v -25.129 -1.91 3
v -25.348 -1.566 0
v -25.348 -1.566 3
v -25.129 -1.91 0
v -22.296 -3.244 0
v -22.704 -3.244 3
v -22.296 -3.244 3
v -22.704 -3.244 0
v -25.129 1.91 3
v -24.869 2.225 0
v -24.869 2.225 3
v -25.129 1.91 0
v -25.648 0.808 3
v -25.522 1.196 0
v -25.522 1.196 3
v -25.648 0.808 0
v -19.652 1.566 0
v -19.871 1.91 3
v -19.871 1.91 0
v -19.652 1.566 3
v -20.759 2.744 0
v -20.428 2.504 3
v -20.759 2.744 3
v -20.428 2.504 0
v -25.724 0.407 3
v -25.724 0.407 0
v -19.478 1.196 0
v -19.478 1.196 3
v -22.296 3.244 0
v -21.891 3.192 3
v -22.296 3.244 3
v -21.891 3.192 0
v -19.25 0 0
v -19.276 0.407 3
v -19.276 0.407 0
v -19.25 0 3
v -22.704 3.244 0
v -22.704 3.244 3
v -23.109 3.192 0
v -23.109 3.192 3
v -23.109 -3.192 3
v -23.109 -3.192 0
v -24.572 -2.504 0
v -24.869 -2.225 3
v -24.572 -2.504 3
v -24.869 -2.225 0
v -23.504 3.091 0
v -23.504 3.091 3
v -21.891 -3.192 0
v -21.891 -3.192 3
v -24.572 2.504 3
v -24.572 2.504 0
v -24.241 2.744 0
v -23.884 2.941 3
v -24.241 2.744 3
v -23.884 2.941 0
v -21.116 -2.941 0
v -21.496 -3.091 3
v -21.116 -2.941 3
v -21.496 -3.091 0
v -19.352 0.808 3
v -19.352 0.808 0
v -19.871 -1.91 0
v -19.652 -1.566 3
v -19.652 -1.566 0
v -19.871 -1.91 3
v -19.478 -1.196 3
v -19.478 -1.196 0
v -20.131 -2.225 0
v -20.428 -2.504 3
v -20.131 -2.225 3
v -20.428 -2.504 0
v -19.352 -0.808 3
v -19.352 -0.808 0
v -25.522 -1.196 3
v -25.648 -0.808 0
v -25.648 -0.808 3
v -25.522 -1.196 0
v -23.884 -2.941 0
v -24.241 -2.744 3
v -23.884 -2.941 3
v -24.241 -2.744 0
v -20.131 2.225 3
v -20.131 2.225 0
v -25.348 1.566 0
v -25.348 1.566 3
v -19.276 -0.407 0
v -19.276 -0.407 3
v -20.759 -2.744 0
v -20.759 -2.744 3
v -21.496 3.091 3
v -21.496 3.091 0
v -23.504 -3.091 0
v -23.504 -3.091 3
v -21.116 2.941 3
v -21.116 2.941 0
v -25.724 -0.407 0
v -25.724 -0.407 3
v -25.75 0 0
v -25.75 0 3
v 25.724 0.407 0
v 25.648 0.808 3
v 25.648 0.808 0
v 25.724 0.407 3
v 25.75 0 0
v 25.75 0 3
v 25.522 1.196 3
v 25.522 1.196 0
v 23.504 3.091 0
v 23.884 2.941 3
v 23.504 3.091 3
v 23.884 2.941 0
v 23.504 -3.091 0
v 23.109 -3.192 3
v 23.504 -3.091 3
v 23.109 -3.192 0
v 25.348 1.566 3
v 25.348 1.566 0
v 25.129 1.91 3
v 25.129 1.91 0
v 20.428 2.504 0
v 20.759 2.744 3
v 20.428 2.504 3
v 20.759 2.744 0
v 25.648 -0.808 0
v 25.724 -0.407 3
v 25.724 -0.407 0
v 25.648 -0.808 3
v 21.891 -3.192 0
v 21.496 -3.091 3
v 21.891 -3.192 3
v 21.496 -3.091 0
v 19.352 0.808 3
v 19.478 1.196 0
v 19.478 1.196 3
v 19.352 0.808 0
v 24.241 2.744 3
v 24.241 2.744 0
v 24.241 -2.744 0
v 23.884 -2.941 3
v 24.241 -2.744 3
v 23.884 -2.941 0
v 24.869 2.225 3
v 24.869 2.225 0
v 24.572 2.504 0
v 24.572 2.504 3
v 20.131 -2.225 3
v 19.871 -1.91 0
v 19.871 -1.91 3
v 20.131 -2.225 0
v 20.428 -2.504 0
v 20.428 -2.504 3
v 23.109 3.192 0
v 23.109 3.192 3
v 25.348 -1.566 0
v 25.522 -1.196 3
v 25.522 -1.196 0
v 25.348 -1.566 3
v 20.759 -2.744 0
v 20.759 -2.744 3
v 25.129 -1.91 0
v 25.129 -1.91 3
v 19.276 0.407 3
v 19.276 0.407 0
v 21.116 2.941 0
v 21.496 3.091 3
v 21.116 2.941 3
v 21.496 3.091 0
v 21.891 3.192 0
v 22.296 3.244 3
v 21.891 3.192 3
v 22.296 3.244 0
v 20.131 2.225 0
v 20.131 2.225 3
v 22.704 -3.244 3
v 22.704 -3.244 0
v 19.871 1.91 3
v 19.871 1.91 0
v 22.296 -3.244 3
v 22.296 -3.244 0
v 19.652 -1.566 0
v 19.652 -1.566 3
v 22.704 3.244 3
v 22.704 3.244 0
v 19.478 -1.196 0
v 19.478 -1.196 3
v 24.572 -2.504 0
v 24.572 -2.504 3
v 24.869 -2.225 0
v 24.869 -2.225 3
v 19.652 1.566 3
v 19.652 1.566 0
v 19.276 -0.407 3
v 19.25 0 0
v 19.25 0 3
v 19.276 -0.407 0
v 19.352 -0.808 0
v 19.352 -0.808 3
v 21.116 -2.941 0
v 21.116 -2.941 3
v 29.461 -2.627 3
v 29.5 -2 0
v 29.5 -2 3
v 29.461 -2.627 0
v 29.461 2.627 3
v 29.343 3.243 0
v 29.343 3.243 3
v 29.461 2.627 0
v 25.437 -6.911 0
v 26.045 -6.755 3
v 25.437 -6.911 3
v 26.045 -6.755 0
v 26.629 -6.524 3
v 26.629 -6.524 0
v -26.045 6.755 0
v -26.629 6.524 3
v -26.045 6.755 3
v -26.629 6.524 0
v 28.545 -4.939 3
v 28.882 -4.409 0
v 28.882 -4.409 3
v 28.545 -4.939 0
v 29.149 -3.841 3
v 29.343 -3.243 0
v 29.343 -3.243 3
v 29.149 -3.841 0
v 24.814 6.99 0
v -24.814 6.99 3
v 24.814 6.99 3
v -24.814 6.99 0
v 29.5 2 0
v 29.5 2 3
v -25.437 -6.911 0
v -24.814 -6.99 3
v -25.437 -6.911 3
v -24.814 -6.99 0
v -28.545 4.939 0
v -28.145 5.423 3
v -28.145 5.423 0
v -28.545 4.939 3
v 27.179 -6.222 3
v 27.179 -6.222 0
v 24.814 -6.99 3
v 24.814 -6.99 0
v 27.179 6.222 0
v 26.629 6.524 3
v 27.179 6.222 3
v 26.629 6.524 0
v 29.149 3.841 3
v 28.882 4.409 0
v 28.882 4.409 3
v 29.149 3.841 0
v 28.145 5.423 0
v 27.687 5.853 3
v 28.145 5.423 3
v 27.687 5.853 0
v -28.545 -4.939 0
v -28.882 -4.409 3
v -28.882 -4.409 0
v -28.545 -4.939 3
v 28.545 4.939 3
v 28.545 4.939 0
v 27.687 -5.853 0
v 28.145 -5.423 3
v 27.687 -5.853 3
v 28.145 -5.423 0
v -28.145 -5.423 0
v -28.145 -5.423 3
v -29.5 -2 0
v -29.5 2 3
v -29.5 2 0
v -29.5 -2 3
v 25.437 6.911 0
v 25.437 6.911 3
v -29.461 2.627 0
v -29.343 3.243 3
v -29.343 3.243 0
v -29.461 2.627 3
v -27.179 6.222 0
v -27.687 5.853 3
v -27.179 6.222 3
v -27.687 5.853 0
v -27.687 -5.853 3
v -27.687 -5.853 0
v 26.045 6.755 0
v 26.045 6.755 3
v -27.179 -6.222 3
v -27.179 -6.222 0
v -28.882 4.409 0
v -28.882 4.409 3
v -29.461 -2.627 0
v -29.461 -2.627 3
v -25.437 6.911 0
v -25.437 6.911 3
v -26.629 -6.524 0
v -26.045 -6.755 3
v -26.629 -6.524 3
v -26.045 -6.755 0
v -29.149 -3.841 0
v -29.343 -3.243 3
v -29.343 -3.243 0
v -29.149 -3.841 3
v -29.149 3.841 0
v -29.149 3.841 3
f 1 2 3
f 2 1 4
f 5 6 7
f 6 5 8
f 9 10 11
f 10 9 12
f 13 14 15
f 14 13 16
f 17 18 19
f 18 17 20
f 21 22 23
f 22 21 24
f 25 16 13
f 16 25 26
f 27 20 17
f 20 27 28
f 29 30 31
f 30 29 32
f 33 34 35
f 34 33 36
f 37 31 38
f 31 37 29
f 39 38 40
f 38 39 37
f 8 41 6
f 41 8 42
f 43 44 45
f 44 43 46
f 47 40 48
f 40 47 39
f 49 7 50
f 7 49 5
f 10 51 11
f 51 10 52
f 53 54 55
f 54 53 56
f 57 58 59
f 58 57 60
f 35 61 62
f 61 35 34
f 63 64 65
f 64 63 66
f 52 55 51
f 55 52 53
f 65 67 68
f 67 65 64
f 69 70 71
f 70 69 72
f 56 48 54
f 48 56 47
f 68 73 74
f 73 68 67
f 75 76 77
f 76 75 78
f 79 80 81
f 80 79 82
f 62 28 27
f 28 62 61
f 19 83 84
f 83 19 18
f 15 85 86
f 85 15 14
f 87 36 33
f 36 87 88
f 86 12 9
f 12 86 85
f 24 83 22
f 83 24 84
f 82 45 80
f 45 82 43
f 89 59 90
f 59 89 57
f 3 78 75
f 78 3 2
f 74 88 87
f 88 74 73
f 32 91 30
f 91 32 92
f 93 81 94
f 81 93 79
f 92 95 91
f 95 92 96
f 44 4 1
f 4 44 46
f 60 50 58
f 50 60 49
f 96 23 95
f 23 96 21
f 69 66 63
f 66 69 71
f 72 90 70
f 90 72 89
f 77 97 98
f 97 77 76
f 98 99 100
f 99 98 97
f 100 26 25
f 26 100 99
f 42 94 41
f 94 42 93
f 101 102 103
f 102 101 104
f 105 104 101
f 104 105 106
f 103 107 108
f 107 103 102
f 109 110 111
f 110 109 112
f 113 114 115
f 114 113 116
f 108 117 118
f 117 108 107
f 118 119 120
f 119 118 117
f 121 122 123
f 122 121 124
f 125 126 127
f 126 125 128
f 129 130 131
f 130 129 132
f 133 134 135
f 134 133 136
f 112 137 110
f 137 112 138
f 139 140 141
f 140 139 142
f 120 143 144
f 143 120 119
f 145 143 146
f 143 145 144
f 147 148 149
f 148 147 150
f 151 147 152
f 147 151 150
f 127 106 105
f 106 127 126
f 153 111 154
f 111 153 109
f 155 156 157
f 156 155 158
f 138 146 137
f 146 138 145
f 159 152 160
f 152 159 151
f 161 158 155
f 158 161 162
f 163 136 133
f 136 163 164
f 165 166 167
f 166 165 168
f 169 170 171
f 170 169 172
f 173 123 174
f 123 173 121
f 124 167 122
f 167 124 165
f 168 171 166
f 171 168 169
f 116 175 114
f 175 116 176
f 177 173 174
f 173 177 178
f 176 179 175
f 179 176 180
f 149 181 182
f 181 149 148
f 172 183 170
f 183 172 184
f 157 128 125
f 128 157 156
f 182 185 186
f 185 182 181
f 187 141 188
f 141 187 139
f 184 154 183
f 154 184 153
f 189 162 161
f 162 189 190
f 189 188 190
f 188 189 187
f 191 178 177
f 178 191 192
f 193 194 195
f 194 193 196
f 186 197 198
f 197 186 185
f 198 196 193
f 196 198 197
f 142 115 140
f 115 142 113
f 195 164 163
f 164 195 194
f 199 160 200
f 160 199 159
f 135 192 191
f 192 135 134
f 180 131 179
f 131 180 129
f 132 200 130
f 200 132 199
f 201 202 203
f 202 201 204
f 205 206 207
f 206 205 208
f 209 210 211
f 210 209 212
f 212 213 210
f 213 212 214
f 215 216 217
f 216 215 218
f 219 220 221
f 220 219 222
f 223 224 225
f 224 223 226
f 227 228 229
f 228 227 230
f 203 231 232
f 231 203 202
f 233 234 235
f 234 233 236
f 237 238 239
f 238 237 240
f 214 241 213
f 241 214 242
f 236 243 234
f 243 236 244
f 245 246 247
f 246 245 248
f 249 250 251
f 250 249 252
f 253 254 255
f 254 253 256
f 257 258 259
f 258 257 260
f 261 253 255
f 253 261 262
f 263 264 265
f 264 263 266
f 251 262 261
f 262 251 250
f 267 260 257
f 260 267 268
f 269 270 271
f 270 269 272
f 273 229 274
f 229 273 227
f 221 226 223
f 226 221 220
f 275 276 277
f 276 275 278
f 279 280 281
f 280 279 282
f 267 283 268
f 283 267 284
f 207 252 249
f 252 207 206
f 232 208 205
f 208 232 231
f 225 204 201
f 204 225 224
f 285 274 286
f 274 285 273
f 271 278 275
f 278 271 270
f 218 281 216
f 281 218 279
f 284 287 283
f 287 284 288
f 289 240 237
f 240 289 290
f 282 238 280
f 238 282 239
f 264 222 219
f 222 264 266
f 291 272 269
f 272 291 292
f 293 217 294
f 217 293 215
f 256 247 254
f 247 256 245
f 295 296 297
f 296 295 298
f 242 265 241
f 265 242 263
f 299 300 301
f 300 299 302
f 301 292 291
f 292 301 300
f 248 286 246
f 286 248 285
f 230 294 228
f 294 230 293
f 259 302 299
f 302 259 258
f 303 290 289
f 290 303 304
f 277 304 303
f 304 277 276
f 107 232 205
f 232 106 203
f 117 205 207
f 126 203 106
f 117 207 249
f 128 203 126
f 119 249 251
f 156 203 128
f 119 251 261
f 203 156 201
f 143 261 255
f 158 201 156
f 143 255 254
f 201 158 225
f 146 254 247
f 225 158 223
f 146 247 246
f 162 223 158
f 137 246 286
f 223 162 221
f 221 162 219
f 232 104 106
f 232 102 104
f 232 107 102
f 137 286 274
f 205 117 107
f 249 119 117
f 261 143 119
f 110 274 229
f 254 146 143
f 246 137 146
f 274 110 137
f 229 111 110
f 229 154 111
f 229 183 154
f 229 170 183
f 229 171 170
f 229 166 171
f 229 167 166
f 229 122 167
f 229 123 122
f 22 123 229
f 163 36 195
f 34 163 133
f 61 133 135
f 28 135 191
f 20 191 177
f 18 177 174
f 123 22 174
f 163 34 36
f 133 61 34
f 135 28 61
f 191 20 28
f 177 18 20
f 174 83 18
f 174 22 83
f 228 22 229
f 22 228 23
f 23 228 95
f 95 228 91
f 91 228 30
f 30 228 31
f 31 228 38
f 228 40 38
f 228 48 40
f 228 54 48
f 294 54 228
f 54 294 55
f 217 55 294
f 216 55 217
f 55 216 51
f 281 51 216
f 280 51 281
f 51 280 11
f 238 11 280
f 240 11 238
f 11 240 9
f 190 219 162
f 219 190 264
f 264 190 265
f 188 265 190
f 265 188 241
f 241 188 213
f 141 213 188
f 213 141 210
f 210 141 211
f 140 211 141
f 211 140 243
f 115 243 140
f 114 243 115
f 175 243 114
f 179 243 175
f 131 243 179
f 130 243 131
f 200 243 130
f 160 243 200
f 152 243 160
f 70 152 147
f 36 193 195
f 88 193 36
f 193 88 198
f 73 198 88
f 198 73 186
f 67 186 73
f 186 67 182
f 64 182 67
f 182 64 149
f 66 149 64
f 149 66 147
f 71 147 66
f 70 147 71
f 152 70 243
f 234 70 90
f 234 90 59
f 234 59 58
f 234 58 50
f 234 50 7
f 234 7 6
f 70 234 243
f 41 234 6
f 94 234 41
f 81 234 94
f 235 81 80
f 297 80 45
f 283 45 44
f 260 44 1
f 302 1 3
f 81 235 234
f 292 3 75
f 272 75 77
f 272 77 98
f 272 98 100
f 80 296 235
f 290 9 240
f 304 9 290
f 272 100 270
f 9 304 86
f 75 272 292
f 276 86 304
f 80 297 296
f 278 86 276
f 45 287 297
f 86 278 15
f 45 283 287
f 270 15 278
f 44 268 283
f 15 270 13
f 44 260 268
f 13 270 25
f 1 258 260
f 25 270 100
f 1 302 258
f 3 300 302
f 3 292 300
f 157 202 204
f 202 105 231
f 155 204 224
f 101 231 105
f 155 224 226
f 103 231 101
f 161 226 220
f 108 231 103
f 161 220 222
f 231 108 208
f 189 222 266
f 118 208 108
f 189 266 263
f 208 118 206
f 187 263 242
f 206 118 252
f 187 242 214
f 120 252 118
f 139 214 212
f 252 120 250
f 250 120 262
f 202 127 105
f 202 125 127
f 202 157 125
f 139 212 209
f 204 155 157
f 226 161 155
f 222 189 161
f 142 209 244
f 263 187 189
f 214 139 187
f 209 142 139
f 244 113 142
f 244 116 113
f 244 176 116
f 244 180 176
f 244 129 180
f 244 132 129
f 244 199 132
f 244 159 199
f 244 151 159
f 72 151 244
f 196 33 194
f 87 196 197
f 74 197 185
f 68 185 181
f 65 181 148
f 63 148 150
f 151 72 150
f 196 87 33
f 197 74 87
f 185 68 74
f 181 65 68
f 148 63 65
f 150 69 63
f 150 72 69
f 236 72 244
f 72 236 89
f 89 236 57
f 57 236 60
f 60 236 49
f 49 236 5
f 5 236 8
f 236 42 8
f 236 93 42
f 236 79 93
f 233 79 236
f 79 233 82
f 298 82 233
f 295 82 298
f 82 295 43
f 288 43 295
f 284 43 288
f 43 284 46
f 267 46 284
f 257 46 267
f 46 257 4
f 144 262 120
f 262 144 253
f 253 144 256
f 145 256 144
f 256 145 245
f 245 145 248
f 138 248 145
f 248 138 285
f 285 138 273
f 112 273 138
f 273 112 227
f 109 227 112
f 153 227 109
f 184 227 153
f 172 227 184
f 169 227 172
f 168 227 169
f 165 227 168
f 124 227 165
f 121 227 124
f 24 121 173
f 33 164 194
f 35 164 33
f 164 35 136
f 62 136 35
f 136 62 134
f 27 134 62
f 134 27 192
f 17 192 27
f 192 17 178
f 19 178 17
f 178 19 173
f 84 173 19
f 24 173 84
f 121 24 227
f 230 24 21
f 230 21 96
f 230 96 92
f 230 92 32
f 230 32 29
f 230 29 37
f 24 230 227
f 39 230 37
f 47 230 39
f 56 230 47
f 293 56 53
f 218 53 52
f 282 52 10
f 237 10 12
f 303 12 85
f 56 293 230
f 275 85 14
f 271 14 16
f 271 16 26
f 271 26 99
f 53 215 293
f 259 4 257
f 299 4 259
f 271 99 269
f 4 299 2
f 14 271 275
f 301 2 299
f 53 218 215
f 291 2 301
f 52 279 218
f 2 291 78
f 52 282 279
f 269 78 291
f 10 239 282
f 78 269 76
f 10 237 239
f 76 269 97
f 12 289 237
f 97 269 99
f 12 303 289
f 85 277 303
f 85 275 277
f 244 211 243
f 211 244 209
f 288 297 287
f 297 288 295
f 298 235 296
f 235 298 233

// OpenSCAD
$fn = 50;


difference() {
	union() {
		hull() {
			translate(v = [-24.5000000000, 2.0000000000, 0]) {
				cylinder(h = 3, r = 5);
			}
			translate(v = [24.5000000000, 2.0000000000, 0]) {
				cylinder(h = 3, r = 5);
			}
			translate(v = [-24.5000000000, -2.0000000000, 0]) {
				cylinder(h = 3, r = 5);
			}
			translate(v = [24.5000000000, -2.0000000000, 0]) {
				cylinder(h = 3, r = 5);
			}
		}
	}
	union() {
		translate(v = [-22.5000000000, 0.0000000000, -100.0000000000]) {
			cylinder(h = 200, r = 3.2500000000);
		}
		translate(v = [-22.5000000000, 0.0000000000, -100.0000000000]) {
			cylinder(h = 200, r = 3.2500000000);
		}
		translate(v = [22.5000000000, 0.0000000000, -100.0000000000]) {
			cylinder(h = 200, r = 3.2500000000);
		}
		translate(v = [22.5000000000, 0.0000000000, -100.0000000000]) {
			cylinder(h = 200, r = 3.2500000000);
		}
	}
}
